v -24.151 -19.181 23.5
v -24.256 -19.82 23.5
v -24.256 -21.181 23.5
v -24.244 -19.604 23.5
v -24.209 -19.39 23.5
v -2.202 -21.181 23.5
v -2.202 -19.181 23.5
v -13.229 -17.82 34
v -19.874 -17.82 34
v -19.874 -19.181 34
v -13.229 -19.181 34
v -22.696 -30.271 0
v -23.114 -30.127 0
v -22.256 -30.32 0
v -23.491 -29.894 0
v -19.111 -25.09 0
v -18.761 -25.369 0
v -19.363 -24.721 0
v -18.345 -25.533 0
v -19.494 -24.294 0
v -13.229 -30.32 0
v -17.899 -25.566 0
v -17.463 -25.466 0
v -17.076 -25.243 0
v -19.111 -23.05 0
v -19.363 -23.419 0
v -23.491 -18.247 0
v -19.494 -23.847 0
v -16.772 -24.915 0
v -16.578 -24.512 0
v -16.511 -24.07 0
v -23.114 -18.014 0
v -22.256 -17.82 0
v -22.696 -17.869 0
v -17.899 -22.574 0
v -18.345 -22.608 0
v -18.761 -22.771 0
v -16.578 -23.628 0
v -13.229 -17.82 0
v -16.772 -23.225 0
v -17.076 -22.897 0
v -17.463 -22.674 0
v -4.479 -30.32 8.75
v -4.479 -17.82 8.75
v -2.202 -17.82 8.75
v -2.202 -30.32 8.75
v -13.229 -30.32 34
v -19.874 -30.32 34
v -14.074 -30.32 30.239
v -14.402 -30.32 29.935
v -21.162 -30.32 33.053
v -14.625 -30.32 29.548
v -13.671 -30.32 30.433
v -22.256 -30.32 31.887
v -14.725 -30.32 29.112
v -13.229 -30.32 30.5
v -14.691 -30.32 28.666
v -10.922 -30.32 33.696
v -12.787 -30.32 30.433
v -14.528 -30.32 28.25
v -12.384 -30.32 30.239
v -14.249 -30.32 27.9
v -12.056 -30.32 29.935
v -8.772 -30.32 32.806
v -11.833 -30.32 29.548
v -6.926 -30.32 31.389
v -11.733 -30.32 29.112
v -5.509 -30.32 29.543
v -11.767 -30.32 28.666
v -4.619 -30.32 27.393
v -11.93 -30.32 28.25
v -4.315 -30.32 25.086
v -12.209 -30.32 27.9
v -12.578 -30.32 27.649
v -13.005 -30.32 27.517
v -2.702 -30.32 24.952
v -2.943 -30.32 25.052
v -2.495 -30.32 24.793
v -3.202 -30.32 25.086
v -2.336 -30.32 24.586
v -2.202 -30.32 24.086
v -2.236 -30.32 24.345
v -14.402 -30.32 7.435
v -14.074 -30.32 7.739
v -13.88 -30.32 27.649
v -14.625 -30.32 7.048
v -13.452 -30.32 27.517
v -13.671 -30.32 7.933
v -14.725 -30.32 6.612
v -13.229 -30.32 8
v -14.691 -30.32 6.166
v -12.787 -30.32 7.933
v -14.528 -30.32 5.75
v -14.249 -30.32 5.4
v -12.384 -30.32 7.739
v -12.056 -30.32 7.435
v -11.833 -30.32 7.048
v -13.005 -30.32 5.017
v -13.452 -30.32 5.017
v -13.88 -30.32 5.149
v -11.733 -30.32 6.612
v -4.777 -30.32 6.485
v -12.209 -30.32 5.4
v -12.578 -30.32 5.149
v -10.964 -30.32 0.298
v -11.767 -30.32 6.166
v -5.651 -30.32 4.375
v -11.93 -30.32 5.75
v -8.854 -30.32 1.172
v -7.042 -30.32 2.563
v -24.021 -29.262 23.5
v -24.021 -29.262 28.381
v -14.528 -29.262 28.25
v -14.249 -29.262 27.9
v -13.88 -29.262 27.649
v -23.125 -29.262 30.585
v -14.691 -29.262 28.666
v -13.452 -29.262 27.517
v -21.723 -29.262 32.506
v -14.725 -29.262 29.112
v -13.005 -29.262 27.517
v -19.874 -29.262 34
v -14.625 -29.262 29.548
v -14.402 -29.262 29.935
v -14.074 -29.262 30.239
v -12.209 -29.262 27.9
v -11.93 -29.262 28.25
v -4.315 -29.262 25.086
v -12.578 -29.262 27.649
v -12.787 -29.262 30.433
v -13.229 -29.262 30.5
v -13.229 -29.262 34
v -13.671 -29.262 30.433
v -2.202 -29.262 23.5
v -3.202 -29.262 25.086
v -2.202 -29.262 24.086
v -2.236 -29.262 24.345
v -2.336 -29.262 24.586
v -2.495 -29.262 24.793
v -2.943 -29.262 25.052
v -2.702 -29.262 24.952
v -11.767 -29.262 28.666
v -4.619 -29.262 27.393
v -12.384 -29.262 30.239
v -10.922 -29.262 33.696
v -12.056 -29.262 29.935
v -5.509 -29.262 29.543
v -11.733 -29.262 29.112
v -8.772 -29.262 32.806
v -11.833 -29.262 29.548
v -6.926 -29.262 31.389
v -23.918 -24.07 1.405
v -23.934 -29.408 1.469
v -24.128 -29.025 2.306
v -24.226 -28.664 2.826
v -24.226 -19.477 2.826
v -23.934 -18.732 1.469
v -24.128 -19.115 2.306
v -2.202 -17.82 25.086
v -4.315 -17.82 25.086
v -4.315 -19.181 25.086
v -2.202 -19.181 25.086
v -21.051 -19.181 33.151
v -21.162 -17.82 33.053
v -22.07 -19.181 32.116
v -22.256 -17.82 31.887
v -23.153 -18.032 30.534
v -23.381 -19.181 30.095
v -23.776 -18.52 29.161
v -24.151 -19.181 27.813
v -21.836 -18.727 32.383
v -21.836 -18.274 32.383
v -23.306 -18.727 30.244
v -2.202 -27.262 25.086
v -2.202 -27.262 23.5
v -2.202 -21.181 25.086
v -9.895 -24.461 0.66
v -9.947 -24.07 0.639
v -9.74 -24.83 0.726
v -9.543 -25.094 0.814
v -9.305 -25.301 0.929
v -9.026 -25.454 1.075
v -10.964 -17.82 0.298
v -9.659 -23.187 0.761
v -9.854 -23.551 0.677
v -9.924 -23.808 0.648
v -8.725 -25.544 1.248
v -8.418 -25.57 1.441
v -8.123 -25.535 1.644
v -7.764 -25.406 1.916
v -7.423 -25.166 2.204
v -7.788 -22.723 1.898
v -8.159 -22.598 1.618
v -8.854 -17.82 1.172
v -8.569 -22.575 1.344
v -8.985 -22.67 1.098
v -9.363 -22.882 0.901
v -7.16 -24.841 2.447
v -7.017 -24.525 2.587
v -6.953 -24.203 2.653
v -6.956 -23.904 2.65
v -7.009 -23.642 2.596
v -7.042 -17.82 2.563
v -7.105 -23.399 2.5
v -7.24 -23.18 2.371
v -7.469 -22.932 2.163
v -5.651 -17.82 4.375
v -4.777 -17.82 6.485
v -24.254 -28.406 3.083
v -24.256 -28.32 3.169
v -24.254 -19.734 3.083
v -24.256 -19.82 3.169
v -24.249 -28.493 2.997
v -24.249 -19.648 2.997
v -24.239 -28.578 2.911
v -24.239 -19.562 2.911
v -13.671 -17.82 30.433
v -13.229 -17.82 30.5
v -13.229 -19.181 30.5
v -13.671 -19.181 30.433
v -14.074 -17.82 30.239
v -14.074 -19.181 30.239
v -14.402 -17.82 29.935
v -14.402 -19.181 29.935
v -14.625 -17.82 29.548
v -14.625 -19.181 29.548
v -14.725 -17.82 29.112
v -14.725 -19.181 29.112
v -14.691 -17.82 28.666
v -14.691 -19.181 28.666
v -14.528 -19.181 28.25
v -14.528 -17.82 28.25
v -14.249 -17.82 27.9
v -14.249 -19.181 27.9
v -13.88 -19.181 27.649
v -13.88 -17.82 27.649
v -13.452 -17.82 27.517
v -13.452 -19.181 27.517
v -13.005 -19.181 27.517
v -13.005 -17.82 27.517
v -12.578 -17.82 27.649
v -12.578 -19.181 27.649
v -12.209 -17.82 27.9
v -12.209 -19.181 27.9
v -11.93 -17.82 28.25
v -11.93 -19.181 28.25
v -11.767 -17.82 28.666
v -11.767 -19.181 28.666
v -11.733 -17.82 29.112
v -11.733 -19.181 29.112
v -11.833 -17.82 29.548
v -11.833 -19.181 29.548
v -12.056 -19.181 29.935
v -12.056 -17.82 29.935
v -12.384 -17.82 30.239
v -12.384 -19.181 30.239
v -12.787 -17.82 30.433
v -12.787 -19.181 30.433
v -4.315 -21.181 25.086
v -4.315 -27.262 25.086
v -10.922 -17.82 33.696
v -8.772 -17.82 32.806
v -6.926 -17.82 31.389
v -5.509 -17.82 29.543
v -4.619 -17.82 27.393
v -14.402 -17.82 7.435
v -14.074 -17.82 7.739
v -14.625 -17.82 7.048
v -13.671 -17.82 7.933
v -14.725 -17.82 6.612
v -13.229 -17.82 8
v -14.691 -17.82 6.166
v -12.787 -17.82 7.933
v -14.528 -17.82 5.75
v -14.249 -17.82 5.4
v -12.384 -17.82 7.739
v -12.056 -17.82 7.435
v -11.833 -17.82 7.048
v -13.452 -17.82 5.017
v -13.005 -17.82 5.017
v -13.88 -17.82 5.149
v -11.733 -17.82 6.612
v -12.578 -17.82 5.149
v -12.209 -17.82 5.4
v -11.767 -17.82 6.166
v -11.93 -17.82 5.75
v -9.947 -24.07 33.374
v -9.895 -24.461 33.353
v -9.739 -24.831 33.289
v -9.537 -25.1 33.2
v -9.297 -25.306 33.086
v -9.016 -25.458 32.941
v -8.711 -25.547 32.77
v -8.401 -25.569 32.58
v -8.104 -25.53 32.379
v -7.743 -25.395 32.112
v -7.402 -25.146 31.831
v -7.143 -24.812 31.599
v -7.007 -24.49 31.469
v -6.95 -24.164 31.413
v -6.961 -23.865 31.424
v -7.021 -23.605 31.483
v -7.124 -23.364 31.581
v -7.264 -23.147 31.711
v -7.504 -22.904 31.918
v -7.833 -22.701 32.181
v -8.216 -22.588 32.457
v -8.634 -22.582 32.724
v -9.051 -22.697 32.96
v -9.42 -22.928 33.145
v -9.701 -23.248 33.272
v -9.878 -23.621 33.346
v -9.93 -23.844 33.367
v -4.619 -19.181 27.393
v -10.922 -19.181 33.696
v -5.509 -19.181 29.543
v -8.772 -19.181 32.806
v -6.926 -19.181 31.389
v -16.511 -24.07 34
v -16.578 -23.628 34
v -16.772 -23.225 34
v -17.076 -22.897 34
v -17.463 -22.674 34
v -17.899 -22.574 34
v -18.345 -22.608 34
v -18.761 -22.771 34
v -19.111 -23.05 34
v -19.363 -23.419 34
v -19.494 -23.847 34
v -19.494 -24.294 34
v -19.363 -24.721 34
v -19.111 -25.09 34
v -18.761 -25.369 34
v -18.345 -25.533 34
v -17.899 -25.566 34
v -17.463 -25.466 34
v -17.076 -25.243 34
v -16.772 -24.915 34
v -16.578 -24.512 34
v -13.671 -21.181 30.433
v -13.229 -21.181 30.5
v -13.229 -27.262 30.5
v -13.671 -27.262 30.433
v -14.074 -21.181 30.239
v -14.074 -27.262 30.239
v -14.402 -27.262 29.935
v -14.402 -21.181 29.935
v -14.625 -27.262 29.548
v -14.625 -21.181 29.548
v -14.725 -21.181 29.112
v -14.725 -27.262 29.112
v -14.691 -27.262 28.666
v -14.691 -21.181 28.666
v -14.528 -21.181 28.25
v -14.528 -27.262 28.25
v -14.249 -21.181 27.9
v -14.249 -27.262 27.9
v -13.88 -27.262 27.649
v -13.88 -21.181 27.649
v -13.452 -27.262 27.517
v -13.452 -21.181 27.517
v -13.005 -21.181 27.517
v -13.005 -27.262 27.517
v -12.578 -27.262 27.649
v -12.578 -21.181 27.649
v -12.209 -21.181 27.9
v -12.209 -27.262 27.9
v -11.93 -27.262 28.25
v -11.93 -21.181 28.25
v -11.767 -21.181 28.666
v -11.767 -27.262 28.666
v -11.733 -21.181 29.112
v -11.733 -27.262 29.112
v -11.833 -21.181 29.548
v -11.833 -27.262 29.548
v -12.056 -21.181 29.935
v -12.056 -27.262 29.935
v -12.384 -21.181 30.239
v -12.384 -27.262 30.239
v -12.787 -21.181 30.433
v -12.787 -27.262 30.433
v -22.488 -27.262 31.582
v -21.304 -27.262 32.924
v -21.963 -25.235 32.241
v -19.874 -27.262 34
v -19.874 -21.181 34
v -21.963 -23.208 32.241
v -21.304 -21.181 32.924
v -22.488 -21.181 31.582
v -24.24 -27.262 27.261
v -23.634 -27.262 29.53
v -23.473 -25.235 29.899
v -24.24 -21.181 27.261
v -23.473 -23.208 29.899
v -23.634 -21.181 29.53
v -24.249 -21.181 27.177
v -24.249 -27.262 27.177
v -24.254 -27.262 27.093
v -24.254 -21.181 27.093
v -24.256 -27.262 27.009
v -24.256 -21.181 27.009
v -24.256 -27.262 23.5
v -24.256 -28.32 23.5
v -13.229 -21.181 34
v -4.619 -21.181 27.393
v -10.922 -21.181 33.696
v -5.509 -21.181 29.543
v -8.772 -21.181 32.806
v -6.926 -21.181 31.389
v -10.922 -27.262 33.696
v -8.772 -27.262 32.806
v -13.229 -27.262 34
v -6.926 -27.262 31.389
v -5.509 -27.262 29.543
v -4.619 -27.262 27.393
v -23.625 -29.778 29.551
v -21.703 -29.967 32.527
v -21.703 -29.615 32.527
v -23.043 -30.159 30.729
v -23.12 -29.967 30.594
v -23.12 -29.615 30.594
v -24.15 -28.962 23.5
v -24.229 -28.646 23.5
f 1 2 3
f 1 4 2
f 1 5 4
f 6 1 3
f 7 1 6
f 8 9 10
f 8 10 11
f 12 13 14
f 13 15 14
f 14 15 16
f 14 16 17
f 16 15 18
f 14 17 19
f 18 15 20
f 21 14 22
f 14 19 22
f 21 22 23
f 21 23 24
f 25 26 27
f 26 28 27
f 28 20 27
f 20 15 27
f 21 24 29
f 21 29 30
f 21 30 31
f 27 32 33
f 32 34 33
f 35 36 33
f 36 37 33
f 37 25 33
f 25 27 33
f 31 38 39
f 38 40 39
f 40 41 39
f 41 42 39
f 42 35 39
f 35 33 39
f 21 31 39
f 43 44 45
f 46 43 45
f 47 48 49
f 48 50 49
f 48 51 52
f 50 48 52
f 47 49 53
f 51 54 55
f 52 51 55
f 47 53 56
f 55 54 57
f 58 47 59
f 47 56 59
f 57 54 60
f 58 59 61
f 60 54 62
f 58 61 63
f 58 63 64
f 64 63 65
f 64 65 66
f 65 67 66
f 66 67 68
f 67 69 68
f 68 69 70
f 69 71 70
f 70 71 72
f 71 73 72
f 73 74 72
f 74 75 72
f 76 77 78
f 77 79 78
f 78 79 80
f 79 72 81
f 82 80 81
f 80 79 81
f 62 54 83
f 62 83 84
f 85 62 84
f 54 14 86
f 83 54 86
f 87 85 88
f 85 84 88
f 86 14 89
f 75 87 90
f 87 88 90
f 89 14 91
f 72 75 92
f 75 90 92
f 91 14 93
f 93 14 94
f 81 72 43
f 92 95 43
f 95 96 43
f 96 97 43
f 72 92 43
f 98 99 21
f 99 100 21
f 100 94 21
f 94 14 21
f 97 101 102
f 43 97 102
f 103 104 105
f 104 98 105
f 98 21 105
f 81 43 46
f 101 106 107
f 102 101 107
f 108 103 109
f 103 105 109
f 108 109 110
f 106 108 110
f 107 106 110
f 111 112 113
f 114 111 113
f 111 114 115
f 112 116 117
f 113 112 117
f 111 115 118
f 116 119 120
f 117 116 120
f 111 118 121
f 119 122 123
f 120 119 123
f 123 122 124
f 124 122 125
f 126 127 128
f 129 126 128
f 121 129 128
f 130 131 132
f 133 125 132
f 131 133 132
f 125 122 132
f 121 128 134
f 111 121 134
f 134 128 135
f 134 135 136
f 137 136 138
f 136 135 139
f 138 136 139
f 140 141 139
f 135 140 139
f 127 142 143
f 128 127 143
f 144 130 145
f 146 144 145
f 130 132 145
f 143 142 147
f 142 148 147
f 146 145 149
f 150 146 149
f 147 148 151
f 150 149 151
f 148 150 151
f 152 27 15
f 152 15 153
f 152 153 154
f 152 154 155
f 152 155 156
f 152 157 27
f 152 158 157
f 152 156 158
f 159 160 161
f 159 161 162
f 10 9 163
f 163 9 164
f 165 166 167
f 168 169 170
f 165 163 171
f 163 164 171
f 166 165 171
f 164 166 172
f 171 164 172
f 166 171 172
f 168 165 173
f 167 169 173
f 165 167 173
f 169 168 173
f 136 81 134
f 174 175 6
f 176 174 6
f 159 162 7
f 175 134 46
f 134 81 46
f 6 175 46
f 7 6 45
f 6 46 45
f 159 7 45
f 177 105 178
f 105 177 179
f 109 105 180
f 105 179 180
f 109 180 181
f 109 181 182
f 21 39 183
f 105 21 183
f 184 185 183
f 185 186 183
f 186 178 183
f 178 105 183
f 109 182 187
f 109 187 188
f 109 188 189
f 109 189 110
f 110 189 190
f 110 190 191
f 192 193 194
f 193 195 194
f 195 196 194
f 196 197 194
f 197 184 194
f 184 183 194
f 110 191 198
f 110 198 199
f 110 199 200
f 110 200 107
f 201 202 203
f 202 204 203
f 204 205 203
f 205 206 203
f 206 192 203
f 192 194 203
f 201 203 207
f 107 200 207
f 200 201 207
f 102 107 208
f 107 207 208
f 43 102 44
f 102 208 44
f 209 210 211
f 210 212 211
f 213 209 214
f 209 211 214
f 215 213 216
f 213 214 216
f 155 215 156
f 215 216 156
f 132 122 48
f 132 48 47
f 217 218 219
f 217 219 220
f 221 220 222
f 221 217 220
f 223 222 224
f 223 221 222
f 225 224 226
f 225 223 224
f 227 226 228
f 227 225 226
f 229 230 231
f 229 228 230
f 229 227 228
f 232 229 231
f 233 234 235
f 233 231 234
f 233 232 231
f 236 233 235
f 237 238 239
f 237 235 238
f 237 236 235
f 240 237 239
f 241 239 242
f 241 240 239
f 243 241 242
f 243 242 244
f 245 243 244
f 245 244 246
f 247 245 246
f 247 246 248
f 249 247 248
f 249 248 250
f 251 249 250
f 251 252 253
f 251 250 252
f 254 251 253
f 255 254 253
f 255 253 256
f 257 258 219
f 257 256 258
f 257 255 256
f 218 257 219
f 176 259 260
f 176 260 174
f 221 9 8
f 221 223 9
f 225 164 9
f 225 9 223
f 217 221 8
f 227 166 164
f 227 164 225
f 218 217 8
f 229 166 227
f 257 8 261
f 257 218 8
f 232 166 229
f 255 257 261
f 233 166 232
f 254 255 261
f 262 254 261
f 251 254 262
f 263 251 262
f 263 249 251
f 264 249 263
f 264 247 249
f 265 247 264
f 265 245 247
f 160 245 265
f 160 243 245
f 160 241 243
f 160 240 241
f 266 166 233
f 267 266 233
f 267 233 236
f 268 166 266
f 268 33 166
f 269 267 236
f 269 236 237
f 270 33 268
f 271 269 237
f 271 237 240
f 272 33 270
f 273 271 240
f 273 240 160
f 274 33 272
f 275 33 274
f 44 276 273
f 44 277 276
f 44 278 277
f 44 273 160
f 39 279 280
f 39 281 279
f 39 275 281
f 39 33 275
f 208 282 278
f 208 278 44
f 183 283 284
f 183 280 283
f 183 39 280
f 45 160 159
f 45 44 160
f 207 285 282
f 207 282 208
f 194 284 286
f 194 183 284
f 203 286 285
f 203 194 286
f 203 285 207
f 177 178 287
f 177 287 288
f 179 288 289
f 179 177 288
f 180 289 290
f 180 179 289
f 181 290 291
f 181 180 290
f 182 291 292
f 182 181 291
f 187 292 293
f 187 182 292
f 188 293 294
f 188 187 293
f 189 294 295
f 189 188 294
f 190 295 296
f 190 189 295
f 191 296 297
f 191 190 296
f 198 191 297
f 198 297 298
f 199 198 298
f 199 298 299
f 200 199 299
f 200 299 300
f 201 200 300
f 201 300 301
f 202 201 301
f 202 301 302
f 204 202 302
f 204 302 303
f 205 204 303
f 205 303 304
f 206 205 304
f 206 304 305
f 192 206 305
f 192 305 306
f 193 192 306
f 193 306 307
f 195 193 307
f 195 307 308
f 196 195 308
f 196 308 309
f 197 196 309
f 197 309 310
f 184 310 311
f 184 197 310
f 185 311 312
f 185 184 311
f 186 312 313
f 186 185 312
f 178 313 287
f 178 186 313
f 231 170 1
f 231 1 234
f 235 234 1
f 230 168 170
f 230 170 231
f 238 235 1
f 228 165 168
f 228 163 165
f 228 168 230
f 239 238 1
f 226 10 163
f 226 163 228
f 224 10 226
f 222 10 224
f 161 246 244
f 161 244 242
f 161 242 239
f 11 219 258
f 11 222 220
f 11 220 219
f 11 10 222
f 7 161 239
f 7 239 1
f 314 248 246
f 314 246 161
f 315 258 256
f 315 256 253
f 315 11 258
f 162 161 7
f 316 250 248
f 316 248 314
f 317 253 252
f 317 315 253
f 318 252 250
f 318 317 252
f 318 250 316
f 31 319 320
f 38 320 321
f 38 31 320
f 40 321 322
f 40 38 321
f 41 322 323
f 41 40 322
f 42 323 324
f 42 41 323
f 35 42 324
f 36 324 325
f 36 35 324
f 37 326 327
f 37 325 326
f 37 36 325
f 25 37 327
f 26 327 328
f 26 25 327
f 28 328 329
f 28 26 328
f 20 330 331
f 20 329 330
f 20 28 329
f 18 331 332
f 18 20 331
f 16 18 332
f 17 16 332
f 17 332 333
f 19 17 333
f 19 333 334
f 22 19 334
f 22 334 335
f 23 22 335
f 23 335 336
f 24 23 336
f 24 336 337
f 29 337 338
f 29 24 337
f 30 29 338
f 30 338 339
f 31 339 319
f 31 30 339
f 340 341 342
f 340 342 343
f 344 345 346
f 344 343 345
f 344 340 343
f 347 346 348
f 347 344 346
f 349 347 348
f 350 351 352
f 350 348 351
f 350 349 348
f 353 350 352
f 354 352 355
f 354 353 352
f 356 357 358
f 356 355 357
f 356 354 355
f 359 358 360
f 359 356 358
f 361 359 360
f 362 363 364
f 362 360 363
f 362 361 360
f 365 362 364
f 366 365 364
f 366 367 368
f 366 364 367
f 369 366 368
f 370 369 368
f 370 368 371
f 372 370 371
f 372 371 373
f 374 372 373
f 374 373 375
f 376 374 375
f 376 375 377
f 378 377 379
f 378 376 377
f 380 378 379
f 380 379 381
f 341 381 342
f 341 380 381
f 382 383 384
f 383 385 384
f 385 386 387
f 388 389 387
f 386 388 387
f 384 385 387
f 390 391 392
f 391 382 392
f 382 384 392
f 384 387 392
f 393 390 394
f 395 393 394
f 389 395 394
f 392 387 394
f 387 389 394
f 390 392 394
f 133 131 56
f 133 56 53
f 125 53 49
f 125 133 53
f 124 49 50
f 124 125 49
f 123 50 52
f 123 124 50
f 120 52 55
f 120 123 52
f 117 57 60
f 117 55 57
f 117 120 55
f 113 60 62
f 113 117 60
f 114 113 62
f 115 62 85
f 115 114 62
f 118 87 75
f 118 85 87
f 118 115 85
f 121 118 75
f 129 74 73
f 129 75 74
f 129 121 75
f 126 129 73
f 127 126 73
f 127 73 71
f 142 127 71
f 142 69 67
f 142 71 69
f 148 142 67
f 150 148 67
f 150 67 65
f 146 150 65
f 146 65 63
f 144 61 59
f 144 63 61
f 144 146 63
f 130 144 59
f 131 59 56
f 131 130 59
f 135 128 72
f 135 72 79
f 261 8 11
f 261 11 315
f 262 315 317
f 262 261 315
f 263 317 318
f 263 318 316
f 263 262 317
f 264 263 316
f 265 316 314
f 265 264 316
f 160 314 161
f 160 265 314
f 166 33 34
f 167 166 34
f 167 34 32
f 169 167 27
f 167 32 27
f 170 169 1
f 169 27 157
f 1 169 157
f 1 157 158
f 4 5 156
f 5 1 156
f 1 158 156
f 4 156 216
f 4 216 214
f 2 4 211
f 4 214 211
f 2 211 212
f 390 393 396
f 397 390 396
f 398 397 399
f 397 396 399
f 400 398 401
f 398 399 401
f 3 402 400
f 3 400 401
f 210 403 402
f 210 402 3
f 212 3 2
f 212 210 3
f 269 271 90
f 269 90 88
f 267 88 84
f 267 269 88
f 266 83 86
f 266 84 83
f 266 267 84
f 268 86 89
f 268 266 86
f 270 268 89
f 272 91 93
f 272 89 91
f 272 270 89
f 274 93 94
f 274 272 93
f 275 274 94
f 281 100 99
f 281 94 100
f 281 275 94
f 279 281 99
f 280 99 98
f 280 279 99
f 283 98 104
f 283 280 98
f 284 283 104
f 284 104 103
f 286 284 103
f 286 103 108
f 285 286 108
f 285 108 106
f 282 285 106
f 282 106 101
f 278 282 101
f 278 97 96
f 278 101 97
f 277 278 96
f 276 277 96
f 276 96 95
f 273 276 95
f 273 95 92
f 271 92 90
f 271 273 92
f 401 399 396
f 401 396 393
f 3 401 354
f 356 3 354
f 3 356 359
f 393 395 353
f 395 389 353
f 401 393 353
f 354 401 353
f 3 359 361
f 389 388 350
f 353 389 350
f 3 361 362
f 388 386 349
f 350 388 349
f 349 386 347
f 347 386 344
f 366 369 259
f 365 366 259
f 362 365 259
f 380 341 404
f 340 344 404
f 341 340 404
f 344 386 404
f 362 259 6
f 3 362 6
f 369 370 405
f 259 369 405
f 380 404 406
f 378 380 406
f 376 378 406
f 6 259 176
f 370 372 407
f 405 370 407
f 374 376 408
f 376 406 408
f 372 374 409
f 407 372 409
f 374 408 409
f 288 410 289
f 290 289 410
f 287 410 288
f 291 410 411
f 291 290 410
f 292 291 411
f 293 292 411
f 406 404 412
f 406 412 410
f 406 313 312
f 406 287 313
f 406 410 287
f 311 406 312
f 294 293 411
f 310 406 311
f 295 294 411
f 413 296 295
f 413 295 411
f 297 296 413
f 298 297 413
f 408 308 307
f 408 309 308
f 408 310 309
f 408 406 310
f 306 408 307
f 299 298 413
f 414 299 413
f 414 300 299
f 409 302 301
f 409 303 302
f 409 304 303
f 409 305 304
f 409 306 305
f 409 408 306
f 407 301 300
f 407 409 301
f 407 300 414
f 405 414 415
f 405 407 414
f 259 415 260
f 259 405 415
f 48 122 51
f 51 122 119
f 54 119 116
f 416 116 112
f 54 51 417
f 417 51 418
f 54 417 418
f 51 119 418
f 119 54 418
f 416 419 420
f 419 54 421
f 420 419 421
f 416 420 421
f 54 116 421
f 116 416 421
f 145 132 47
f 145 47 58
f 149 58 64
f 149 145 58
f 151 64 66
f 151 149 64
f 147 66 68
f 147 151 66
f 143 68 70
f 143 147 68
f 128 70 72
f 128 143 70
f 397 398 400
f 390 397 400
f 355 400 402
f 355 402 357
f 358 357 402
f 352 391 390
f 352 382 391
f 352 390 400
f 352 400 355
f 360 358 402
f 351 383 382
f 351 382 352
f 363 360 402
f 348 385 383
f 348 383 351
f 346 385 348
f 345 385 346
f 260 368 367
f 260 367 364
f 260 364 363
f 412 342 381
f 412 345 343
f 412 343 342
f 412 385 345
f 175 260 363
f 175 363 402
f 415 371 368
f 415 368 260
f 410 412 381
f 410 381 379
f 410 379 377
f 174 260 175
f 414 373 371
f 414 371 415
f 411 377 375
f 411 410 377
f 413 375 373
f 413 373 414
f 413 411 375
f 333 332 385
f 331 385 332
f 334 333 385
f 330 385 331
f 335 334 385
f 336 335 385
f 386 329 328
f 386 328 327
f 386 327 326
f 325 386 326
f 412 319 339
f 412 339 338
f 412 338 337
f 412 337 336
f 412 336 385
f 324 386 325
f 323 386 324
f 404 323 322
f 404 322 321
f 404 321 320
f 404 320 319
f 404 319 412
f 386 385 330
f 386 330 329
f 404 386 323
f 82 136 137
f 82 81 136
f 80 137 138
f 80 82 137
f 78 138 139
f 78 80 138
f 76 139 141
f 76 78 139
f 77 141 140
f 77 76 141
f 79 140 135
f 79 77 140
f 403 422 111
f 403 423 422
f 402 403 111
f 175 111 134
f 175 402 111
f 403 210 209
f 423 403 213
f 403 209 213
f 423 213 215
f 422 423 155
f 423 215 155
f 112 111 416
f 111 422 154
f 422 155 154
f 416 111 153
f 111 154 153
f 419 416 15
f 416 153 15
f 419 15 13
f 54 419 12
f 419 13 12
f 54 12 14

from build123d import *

# Parameters (mm, degrees)
SKETCH1_W               = 22.054431489
SKETCH1_H               = 12.5
BOSS_EXTRUDE1_DEPTH     = 34
CUT_EXTRUDE1_DEPTH      = 10
CUT_EXTRUDE1_DEPTH_BACK = 15
SKETCH2_R               = 1.5
FILLET3_R               = 2
SKETCH5_R               = 1.5
CUT_EXTRUDE4_DEPTH      = 52.610795679
SKETCH16_W              = 22.05443149
SKETCH16_H              = 2
CUT_EXTRUDE6_DEPTH      = 14.5
FILLET4_R               = 1


with BuildPart() as part:
    # Sketch1 → Boss-Extrude1 (new body)
    with BuildSketch(Plane.XY):
        with Locations((-13.228930986, -24.070183414)):
            Rectangle(SKETCH1_W, SKETCH1_H)
    extrude(amount=BOSS_EXTRUDE1_DEPTH)

    # Sketch2 → Cut-Extrude1 (cut, two sides: drawn at the far end of the back side and taken through both)
    with BuildSketch(Plane.XZ.offset(30.320183414).offset(-CUT_EXTRUDE1_DEPTH_BACK)):
        with Locations(Location((-13.228930986, 6.5, 0), (0, 0, 90))):
            Circle(SKETCH2_R)
        with Locations(Location((-13.228930986, 29, 0), (0, 0, 90))):
            Circle(SKETCH2_R)
        with BuildLine():
            Line((-4.315096089, 25.086165103), (-2.201715242, 25.086165103))
            add(Edge.make_bspline(
                [(-24.256146731, 25.458595261), (-35.656041951, 36.540332573), (-13.006901701, 52.285060009), (9.32231541, 36.338450422), (-2.201715242, 25.086165103)],
                knots=[0, 0, 0, 0, 0.496841919, 1, 1, 1, 1], degree=3))
            add(Edge.make_bspline(
                [(-13.228930986, 34), (-19.086447972, 37.422293362), (-24.885707195, 30.868976401), (-24.256146731, 25.458595261)],
                knots=[0, 0, 0, 0, 1, 1, 1, 1], degree=3))
            ThreePointArc((-13.228930986, 34), (-6.925897884, 31.389198205), (-4.315096089, 25.086165103))
        make_face()
        with BuildLine():
            Line((-4.478930986, 8.75), (-2.201715242, 8.75))
            add(Edge.make_bspline(
                [(-2.201715242, 8.75), (5.39210746, 3.880294823), (-0.777052631, -4.523329032), (-17.174300591, -10.623347238), (-34.821400648, -0.026005424), (-24.256146731, 8.75)],
                knots=[0, 0, 0, 0, 0.283272691, 0.504244858, 1, 1, 1, 1], degree=3))
            add(Edge.make_bspline(
                [(-23.490579314, 0), (-24.966512963, 4.237786421), (-24.256146731, 8.75)],
                knots=[0, 0, 0, 1, 1, 1], degree=2))
            Line((-23.490579314, 0), (-13.228930986, 0))
            ThreePointArc((-13.228930986, 0), (-7.041746651, 2.562815665), (-4.478930986, 8.75))
        make_face()
    extrude(amount=CUT_EXTRUDE1_DEPTH + CUT_EXTRUDE1_DEPTH_BACK, mode=Mode.SUBTRACT)

    # Fillet3
    # the kernel refuses this fillet: 2 mm, written as the material it takes off along each edge
    with BuildSketch(Plane(origin=(-24.256146731, -17.820183414, -1.998495188), x_dir=(1, 0, 0), z_dir=(0, 0, 1))) as fillet3_piece_1:
        with BuildLine():
            CenterArc((FILLET3_R, -FILLET3_R), FILLET3_R, 90, 90)
            Line((0, -FILLET3_R), (0, 0))
            Line((0, 0), (FILLET3_R, 0))
        make_face()
    extrude(amount=34.125242274, mode=Mode.SUBTRACT)
    with BuildSketch(Plane(origin=(-24.256146731, -30.320183414, -1.998495188), x_dir=(1, 0, 0), z_dir=(0, 0, 1))) as fillet3_piece_2:
        with BuildLine():
            CenterArc((FILLET3_R, FILLET3_R), FILLET3_R, 180, 90)
            Line((0, FILLET3_R), (0, 0))
            Line((0, 0), (FILLET3_R, 0))
        make_face()
    extrude(amount=34.125242274, mode=Mode.SUBTRACT)
    with BuildSketch(Plane(origin=(-24.256146731, -17.374523396, 3.001504812), x_dir=(0.1667681859257429, 1.4874647964432132e-15, -0.9859961319209304), z_dir=(0, -1, 0))) as fillet3_piece_3:
        with BuildLine():
            CenterArc((0.168096911, 1.999974157), FILLET3_R, 260.400032587, 9.891234523)
            Line((-0.165439461, 0.027981894), (0, 0))
            ThreePointArc((0, 0), (0.089132004, -0.000226606), (0.178264007, 0))
        make_face()
    extrude(amount=13.331280444, mode=Mode.SUBTRACT)
    with BuildSketch(Plane(origin=(-24.256146731, -17.482274803, 27.126747086), x_dir=(0.11756979569322837, -1.02728794699617e-15, 0.9930646218351818), z_dir=(0, -1, 0))) as fillet3_piece_4:
        with BuildLine():
            CenterArc((0.118560979, -1.999931088), FILLET3_R, 89.524368939, 7.227500304)
            Line((-0.116578613, -0.013801845), (0, 0))
            ThreePointArc((0, 0), (0.067581725, 0.000281106), (0.135163444, 0))
        make_face()
    extrude(amount=13.131401648, mode=Mode.SUBTRACT)

    # Sketch5 → Cut-Extrude4 (cut, through all)
    with BuildSketch(Plane.XY):
        with Locations((-18.011106811, -24.070183414)):
            Circle(SKETCH5_R)
        with Locations(Location((-8.446755162, -24.070183414, 0), (0, 0, 180))):
            Circle(SKETCH5_R)
    extrude(amount=CUT_EXTRUDE4_DEPTH, mode=Mode.SUBTRACT)

    # Sketch16 → Cut-Extrude6 (cut)
    with BuildSketch(Plane.XY.offset(38)):
        with Locations((-13.228930985, -20.1809771)):
            Rectangle(SKETCH16_W, SKETCH16_H)
        with Locations((-13.228930985, -28.261916897)):
            Rectangle(SKETCH16_W, SKETCH16_H)
    extrude(amount=-CUT_EXTRUDE6_DEPTH, mode=Mode.SUBTRACT)

    # Fillet4
    fillet4_edges = [part.edges().sort_by_distance(p)[0] for p in [
        (-2.201715242, -29.791050155, 25.086165103),
    ]]
    fillet(fillet4_edges, radius=FILLET4_R)


solid = part.part
